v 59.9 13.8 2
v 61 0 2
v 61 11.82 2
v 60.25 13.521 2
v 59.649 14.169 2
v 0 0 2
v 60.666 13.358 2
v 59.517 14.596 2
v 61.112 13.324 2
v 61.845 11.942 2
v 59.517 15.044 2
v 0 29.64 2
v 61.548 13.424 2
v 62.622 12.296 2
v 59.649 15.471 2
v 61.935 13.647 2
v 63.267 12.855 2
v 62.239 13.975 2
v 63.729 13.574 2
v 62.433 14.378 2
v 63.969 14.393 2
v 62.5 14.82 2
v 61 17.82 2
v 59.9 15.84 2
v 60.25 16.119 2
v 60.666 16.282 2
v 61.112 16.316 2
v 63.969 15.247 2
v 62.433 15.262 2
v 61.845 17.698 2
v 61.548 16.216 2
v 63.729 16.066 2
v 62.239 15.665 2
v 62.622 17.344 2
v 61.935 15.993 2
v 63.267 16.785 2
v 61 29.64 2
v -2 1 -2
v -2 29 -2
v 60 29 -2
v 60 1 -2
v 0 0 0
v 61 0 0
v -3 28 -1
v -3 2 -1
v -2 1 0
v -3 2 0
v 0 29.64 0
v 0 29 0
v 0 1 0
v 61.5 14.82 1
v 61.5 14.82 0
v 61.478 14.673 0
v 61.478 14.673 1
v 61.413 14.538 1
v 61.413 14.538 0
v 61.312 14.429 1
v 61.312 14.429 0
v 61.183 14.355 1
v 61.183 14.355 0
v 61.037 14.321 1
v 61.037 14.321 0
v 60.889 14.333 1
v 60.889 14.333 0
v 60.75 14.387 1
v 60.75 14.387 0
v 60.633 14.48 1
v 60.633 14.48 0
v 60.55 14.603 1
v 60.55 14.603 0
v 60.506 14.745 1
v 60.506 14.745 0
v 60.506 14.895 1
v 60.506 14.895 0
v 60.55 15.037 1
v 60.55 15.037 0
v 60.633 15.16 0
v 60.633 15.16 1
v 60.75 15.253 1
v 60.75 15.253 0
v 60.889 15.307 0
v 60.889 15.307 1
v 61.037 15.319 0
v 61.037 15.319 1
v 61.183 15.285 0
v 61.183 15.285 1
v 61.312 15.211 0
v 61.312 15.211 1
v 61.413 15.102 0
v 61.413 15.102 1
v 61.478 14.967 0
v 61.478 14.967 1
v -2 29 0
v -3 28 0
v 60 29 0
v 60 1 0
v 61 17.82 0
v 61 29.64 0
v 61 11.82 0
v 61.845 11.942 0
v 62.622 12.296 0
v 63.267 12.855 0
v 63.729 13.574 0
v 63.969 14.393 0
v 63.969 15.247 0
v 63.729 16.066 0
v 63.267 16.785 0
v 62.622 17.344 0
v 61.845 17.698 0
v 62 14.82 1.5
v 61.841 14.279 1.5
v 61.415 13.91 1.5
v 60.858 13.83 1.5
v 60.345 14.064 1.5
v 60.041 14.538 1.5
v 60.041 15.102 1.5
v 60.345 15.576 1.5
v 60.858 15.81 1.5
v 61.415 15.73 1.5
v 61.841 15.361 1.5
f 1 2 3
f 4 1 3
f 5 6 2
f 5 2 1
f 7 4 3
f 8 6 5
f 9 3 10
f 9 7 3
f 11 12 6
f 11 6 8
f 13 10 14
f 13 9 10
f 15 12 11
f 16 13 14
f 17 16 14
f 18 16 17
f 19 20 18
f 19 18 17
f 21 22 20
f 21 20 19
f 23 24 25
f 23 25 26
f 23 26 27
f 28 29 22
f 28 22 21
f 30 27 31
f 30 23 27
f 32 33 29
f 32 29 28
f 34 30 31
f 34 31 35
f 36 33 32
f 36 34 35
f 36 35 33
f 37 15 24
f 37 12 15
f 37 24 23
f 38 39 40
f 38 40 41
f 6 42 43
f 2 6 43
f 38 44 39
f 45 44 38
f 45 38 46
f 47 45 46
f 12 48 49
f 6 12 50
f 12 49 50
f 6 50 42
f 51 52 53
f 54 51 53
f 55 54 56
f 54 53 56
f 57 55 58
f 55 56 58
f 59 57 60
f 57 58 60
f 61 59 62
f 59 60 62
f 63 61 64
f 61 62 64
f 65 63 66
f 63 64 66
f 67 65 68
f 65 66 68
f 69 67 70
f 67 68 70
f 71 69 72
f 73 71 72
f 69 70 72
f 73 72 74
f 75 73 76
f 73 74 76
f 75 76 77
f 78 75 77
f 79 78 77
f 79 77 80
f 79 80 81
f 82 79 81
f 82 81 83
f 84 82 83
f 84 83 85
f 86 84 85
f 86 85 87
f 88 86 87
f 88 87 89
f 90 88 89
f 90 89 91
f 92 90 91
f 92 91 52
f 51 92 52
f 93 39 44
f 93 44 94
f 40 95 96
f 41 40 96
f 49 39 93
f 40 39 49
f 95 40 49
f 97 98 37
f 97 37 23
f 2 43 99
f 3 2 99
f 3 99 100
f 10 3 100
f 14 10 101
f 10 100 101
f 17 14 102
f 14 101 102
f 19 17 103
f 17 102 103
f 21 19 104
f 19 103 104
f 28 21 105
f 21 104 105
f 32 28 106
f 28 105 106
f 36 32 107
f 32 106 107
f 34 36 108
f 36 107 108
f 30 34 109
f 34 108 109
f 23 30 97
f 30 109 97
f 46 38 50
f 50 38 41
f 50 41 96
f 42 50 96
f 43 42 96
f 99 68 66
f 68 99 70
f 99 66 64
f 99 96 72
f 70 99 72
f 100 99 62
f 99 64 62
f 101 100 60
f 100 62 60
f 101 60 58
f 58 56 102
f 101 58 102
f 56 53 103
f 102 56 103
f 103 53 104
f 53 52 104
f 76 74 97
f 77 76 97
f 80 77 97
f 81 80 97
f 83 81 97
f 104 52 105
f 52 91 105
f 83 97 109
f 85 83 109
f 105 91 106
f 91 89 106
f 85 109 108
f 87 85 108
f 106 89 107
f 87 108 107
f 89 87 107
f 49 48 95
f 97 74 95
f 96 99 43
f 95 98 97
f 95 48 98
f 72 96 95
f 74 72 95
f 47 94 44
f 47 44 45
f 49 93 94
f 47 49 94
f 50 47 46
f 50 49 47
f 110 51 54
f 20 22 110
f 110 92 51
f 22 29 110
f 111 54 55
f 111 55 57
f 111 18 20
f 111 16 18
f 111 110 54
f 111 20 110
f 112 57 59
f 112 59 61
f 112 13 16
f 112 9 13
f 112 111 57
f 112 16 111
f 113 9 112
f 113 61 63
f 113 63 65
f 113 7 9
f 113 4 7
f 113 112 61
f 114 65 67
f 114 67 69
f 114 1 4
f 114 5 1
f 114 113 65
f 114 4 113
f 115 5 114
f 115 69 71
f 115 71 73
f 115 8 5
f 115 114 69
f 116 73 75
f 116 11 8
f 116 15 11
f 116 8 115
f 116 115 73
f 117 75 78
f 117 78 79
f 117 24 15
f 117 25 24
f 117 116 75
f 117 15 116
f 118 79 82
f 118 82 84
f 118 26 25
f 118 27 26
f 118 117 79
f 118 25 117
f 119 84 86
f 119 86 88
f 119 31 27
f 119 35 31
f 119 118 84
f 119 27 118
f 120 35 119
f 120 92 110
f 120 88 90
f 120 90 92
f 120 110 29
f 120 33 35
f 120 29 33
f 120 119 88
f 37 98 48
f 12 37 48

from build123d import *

# Parameters (mm, degrees)
PAD_DEPTH       = 2
SKETCH001_R     = 0.5
POCKET_DEPTH    = 5
SKETCH002_W     = 59
SKETCH002_H     = 28
PAD001_DEPTH    = 2
SKETCH003_W     = 28
SKETCH003_H     = 2
PAD002_DEPTH    = 4
CHAMFER_SIZE    = 1
CHAMFER001_SIZE = 1


with BuildPart() as part:
    # Sketch → Pad (new body)
    with BuildSketch(Plane.XY):
        with BuildLine():
            Line((0, 0), (61, 0))
            Line((61, 0), (61, 11.82))
            ThreePointArc((61, 11.82), (64, 14.82), (61, 17.82))
            Line((61, 29.64), (61, 17.82))
            Line((61, 29.64), (0, 29.64))
            Line((0, 29.64), (0, 0))
        make_face()
    extrude(amount=PAD_DEPTH)

    # Sketch001 (on Face7 of Pad) → Pocket (cut)
    with BuildSketch(Plane(origin=(0, 0, 0), x_dir=(1, 0, 0), z_dir=(0, 0, -1))):
        with Locations((61, -14.82)):
            Circle(SKETCH001_R)
    extrude(amount=-POCKET_DEPTH, mode=Mode.SUBTRACT)

    # Sketch002 (on Face4 of Pocket) → Pad001 (join)
    with BuildSketch(Plane(origin=(0, 0, 0), x_dir=(1, 0, 0), z_dir=(0, 0, -1))):
        with Locations((30.5, -15)):
            Rectangle(SKETCH002_W, SKETCH002_H)
    extrude(amount=PAD001_DEPTH)

    # Sketch003 (on Face13 of Pad001) → Pad002 (join)
    with BuildSketch(Plane(origin=(1, 0, 0), x_dir=(0, -1, 0), z_dir=(-1, 0, 0))):
        with Locations((-15, -1)):
            Rectangle(SKETCH003_W, SKETCH003_H)
    extrude(amount=PAD002_DEPTH)

    # Chamfer
    chamfer_edges = [part.edges().sort_by_distance(p)[0] for p in [
        (-3, 1, -1),
        (-3, 29, -1),
        (-3, 15, -2),
    ]]
    chamfer(chamfer_edges, length=CHAMFER_SIZE)

    # Chamfer001
    chamfer001_edges = [part.edges().sort_by_distance(p)[0] for p in [
        (60.5, 14.82, 2),
    ]]
    chamfer(chamfer001_edges, length=CHAMFER001_SIZE)


solid = part.part
